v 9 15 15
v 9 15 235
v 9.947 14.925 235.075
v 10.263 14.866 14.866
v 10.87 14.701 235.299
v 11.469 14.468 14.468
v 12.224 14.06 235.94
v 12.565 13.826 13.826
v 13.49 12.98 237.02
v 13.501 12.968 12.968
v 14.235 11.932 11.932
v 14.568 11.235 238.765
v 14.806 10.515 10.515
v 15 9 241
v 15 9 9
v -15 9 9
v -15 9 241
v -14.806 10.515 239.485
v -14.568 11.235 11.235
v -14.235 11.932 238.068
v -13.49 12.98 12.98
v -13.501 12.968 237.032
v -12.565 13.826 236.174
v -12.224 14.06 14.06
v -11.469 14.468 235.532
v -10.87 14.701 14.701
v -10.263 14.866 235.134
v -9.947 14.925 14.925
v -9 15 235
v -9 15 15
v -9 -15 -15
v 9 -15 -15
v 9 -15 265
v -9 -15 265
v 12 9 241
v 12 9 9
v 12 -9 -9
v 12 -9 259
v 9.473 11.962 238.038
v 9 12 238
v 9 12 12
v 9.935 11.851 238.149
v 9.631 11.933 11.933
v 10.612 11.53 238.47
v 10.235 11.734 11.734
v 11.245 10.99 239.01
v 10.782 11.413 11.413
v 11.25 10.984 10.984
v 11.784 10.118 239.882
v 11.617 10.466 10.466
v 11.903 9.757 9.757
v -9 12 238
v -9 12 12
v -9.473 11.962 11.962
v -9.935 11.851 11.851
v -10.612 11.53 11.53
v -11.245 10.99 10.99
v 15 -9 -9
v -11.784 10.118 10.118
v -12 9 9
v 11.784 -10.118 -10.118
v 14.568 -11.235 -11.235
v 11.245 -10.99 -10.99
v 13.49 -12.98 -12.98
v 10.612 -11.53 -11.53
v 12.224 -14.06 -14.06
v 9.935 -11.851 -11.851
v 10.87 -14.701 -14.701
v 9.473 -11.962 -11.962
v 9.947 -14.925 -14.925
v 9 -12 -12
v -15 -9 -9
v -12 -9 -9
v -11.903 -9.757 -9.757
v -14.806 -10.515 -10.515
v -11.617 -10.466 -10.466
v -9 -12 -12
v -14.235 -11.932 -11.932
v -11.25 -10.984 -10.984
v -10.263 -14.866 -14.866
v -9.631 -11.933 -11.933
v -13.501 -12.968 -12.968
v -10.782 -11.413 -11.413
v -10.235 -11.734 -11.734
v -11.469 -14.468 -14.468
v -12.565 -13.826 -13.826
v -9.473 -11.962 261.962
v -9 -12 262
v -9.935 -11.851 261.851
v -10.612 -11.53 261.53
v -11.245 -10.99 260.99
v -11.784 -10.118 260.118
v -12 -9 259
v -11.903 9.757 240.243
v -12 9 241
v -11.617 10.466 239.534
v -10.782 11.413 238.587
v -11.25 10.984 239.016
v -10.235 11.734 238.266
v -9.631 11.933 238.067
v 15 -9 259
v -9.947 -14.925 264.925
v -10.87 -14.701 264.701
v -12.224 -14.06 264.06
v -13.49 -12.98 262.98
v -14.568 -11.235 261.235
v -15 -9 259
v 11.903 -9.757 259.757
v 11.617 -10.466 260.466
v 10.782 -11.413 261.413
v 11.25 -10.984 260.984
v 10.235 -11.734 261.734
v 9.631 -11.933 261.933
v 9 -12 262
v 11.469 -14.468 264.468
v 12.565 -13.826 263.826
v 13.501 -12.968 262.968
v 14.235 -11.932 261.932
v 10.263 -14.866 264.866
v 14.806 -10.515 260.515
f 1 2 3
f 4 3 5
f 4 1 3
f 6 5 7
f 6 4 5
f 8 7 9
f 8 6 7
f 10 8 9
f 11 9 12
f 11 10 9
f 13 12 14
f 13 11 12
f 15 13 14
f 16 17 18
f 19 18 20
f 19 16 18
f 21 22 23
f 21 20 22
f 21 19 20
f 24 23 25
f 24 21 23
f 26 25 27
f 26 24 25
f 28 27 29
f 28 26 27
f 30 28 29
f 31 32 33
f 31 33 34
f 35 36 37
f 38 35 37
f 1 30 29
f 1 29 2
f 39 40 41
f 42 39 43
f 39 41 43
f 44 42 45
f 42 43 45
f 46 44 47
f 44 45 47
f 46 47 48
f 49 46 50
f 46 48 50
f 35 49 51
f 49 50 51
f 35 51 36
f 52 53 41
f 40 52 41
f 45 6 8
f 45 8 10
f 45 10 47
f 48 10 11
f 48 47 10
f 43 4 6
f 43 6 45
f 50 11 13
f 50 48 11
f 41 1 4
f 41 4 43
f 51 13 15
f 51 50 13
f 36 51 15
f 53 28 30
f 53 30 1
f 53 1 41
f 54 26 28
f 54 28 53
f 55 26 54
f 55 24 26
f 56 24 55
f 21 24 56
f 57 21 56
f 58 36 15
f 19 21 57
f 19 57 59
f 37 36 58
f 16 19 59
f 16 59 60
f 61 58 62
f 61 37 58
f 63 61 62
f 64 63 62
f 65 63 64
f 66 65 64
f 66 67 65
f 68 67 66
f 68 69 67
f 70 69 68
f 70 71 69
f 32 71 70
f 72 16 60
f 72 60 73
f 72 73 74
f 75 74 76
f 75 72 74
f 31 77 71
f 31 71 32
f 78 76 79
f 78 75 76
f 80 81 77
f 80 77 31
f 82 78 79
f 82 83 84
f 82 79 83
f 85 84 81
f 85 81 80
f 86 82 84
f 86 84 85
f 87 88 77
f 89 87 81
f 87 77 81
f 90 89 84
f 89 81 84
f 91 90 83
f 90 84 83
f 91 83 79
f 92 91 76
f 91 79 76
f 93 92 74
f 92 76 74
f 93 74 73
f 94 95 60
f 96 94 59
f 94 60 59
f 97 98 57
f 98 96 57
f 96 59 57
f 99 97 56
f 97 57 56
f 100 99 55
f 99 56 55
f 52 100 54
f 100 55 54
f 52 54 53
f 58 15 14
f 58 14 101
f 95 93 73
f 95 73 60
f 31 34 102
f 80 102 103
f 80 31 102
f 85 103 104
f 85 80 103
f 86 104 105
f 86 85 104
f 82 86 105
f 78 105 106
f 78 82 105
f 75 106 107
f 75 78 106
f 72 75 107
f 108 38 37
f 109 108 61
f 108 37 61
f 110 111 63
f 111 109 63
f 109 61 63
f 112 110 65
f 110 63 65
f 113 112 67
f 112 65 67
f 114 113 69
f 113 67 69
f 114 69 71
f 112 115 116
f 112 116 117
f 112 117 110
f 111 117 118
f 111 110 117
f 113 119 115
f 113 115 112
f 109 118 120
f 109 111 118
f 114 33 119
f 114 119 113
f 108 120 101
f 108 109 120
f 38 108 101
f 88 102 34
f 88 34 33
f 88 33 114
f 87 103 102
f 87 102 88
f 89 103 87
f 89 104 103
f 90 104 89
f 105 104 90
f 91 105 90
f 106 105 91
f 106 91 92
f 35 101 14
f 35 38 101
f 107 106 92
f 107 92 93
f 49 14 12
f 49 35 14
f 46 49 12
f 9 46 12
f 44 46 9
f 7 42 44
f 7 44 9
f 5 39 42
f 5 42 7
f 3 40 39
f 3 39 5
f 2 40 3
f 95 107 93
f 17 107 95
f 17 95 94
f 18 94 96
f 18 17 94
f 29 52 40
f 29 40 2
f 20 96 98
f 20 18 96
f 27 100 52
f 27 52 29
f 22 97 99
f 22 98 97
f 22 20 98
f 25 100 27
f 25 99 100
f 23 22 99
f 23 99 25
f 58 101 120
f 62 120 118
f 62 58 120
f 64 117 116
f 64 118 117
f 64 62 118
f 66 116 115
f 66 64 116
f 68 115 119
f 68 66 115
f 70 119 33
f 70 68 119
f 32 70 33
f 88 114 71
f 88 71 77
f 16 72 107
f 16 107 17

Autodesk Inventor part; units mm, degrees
ref_plane "Start Plane" through (0, 0, -15) normal (0, 0, 1) x (1, 0, 0)
ref_plane "End Plane" through (0, 0, 265) normal (0, 0, 1) x (1, 0, 0)
sketch "Sketch" plane through (0, 0, 0) normal (0, 0, 1) x (1, 0, 0)
  line L0 (-15, -9) -> (-15, 9)
  line L1 (-9, 15) -> (9, 15)
  line L2 (15, 9) -> (15, -9)
  line L3 (9, -15) -> (-9, -15)
  arc A0 (-15, -9) -> (-9, -15) centre (-9, -9) ccw
  arc A1 (-9, 15) -> (-15, 9) centre (-9, 9) ccw
  arc A2 (15, 9) -> (9, 15) centre (9, 9) ccw
  arc A3 (9, -15) -> (15, -9) centre (9, -9) ccw
  arc A4 (-9, 12) -> (-12, 9) centre (-9, 9) ccw
  line L4 (-9, 12) -> (9, 12)
  arc A5 (12, 9) -> (9, 12) centre (9, 9) ccw
  line L5 (12, 9) -> (12, -9)
  arc A6 (9, -12) -> (12, -9) centre (9, -9) ccw
  line L6 (9, -12) -> (-9, -12)
  arc A7 (-12, -9) -> (-9, -12) centre (-9, -9) ccw
  line L7 (-12, -9) -> (-12, 9)
  line L8 (0, 22.7397) -> (0, -22.7397) construction
  line L9 (-22.7397, 0) -> (22.7397, 0) construction
  dimension "d7" = 6
  dimension "d10" = 30
  dimension "d11" = 30
  dimension "d12" = 3
  dimension "d15" = 15
  dimension "d16" = 15
extrude "Body" add sketch "Sketch" along normal up to surface (280 mm away) from surface at -15
sketch "Sketch3" plane through (0, 0, 0) normal (0, 0, 1) x (1, 0, 0)
  line L0 (0, 0) -> (10, 0)
ref_plane "Work Plane3" through (0, 0, 0) normal (0, -1, 0) x (1, 0, 0)
ref_plane "Work Plane4" through (0, -15, -15) normal (0, 0.7071, -0.7071) x (1, 0, 0)
split "Split1" plane through (0, -15, -15) removes the side toward (0, 0.7071, -0.7071)
ref_plane "Work Plane5" through (0, -15, 265) normal (0, 0.7071, 0.7071) x (1, 0, 0)
split "Split2" plane through (0, -15, 265) removes the side toward (0, 0.7071, 0.7071)
sketch "Sketch4" plane through (0, 0, 0) normal (0, -1, 0) x (1, 0, 0)
  line L0 (-2, -15) -> (12, -15) projected
  line L1 (-2, 265) -> (12, 265) projected
  dimension "d18" = 280
equation "\"d7\" = G_IR"
equation "\"d10\" = G_H"
equation "\"d11\" = G_W"
equation "\"d12\" = G_T"
equation "\"d15\" = 0.5 * d10"
equation "\"d16\" = 0.5 * d11"
equation "\"d3\" = G_L"
equation "\"G_W\" = 30"
equation "\"G_H\" = 30"
equation "\"G_T\" = 3"
equation "\"G_IR\" = 6"
equation "\"G_L\" = d18"
equation "\"G_OFFSET_START\" = 15"
equation "\"G_OFFSET_END\" = 15"
equation "\"d13\" = -G_OFFSET_START"
equation "\"d14\" = G_OFFSET_END + B_L"
equation "\"B_L\" = 250"
properties part number "DIN EN 10219-2 - 30 x 30 x 3  - 280" material "Steel, Mild"
